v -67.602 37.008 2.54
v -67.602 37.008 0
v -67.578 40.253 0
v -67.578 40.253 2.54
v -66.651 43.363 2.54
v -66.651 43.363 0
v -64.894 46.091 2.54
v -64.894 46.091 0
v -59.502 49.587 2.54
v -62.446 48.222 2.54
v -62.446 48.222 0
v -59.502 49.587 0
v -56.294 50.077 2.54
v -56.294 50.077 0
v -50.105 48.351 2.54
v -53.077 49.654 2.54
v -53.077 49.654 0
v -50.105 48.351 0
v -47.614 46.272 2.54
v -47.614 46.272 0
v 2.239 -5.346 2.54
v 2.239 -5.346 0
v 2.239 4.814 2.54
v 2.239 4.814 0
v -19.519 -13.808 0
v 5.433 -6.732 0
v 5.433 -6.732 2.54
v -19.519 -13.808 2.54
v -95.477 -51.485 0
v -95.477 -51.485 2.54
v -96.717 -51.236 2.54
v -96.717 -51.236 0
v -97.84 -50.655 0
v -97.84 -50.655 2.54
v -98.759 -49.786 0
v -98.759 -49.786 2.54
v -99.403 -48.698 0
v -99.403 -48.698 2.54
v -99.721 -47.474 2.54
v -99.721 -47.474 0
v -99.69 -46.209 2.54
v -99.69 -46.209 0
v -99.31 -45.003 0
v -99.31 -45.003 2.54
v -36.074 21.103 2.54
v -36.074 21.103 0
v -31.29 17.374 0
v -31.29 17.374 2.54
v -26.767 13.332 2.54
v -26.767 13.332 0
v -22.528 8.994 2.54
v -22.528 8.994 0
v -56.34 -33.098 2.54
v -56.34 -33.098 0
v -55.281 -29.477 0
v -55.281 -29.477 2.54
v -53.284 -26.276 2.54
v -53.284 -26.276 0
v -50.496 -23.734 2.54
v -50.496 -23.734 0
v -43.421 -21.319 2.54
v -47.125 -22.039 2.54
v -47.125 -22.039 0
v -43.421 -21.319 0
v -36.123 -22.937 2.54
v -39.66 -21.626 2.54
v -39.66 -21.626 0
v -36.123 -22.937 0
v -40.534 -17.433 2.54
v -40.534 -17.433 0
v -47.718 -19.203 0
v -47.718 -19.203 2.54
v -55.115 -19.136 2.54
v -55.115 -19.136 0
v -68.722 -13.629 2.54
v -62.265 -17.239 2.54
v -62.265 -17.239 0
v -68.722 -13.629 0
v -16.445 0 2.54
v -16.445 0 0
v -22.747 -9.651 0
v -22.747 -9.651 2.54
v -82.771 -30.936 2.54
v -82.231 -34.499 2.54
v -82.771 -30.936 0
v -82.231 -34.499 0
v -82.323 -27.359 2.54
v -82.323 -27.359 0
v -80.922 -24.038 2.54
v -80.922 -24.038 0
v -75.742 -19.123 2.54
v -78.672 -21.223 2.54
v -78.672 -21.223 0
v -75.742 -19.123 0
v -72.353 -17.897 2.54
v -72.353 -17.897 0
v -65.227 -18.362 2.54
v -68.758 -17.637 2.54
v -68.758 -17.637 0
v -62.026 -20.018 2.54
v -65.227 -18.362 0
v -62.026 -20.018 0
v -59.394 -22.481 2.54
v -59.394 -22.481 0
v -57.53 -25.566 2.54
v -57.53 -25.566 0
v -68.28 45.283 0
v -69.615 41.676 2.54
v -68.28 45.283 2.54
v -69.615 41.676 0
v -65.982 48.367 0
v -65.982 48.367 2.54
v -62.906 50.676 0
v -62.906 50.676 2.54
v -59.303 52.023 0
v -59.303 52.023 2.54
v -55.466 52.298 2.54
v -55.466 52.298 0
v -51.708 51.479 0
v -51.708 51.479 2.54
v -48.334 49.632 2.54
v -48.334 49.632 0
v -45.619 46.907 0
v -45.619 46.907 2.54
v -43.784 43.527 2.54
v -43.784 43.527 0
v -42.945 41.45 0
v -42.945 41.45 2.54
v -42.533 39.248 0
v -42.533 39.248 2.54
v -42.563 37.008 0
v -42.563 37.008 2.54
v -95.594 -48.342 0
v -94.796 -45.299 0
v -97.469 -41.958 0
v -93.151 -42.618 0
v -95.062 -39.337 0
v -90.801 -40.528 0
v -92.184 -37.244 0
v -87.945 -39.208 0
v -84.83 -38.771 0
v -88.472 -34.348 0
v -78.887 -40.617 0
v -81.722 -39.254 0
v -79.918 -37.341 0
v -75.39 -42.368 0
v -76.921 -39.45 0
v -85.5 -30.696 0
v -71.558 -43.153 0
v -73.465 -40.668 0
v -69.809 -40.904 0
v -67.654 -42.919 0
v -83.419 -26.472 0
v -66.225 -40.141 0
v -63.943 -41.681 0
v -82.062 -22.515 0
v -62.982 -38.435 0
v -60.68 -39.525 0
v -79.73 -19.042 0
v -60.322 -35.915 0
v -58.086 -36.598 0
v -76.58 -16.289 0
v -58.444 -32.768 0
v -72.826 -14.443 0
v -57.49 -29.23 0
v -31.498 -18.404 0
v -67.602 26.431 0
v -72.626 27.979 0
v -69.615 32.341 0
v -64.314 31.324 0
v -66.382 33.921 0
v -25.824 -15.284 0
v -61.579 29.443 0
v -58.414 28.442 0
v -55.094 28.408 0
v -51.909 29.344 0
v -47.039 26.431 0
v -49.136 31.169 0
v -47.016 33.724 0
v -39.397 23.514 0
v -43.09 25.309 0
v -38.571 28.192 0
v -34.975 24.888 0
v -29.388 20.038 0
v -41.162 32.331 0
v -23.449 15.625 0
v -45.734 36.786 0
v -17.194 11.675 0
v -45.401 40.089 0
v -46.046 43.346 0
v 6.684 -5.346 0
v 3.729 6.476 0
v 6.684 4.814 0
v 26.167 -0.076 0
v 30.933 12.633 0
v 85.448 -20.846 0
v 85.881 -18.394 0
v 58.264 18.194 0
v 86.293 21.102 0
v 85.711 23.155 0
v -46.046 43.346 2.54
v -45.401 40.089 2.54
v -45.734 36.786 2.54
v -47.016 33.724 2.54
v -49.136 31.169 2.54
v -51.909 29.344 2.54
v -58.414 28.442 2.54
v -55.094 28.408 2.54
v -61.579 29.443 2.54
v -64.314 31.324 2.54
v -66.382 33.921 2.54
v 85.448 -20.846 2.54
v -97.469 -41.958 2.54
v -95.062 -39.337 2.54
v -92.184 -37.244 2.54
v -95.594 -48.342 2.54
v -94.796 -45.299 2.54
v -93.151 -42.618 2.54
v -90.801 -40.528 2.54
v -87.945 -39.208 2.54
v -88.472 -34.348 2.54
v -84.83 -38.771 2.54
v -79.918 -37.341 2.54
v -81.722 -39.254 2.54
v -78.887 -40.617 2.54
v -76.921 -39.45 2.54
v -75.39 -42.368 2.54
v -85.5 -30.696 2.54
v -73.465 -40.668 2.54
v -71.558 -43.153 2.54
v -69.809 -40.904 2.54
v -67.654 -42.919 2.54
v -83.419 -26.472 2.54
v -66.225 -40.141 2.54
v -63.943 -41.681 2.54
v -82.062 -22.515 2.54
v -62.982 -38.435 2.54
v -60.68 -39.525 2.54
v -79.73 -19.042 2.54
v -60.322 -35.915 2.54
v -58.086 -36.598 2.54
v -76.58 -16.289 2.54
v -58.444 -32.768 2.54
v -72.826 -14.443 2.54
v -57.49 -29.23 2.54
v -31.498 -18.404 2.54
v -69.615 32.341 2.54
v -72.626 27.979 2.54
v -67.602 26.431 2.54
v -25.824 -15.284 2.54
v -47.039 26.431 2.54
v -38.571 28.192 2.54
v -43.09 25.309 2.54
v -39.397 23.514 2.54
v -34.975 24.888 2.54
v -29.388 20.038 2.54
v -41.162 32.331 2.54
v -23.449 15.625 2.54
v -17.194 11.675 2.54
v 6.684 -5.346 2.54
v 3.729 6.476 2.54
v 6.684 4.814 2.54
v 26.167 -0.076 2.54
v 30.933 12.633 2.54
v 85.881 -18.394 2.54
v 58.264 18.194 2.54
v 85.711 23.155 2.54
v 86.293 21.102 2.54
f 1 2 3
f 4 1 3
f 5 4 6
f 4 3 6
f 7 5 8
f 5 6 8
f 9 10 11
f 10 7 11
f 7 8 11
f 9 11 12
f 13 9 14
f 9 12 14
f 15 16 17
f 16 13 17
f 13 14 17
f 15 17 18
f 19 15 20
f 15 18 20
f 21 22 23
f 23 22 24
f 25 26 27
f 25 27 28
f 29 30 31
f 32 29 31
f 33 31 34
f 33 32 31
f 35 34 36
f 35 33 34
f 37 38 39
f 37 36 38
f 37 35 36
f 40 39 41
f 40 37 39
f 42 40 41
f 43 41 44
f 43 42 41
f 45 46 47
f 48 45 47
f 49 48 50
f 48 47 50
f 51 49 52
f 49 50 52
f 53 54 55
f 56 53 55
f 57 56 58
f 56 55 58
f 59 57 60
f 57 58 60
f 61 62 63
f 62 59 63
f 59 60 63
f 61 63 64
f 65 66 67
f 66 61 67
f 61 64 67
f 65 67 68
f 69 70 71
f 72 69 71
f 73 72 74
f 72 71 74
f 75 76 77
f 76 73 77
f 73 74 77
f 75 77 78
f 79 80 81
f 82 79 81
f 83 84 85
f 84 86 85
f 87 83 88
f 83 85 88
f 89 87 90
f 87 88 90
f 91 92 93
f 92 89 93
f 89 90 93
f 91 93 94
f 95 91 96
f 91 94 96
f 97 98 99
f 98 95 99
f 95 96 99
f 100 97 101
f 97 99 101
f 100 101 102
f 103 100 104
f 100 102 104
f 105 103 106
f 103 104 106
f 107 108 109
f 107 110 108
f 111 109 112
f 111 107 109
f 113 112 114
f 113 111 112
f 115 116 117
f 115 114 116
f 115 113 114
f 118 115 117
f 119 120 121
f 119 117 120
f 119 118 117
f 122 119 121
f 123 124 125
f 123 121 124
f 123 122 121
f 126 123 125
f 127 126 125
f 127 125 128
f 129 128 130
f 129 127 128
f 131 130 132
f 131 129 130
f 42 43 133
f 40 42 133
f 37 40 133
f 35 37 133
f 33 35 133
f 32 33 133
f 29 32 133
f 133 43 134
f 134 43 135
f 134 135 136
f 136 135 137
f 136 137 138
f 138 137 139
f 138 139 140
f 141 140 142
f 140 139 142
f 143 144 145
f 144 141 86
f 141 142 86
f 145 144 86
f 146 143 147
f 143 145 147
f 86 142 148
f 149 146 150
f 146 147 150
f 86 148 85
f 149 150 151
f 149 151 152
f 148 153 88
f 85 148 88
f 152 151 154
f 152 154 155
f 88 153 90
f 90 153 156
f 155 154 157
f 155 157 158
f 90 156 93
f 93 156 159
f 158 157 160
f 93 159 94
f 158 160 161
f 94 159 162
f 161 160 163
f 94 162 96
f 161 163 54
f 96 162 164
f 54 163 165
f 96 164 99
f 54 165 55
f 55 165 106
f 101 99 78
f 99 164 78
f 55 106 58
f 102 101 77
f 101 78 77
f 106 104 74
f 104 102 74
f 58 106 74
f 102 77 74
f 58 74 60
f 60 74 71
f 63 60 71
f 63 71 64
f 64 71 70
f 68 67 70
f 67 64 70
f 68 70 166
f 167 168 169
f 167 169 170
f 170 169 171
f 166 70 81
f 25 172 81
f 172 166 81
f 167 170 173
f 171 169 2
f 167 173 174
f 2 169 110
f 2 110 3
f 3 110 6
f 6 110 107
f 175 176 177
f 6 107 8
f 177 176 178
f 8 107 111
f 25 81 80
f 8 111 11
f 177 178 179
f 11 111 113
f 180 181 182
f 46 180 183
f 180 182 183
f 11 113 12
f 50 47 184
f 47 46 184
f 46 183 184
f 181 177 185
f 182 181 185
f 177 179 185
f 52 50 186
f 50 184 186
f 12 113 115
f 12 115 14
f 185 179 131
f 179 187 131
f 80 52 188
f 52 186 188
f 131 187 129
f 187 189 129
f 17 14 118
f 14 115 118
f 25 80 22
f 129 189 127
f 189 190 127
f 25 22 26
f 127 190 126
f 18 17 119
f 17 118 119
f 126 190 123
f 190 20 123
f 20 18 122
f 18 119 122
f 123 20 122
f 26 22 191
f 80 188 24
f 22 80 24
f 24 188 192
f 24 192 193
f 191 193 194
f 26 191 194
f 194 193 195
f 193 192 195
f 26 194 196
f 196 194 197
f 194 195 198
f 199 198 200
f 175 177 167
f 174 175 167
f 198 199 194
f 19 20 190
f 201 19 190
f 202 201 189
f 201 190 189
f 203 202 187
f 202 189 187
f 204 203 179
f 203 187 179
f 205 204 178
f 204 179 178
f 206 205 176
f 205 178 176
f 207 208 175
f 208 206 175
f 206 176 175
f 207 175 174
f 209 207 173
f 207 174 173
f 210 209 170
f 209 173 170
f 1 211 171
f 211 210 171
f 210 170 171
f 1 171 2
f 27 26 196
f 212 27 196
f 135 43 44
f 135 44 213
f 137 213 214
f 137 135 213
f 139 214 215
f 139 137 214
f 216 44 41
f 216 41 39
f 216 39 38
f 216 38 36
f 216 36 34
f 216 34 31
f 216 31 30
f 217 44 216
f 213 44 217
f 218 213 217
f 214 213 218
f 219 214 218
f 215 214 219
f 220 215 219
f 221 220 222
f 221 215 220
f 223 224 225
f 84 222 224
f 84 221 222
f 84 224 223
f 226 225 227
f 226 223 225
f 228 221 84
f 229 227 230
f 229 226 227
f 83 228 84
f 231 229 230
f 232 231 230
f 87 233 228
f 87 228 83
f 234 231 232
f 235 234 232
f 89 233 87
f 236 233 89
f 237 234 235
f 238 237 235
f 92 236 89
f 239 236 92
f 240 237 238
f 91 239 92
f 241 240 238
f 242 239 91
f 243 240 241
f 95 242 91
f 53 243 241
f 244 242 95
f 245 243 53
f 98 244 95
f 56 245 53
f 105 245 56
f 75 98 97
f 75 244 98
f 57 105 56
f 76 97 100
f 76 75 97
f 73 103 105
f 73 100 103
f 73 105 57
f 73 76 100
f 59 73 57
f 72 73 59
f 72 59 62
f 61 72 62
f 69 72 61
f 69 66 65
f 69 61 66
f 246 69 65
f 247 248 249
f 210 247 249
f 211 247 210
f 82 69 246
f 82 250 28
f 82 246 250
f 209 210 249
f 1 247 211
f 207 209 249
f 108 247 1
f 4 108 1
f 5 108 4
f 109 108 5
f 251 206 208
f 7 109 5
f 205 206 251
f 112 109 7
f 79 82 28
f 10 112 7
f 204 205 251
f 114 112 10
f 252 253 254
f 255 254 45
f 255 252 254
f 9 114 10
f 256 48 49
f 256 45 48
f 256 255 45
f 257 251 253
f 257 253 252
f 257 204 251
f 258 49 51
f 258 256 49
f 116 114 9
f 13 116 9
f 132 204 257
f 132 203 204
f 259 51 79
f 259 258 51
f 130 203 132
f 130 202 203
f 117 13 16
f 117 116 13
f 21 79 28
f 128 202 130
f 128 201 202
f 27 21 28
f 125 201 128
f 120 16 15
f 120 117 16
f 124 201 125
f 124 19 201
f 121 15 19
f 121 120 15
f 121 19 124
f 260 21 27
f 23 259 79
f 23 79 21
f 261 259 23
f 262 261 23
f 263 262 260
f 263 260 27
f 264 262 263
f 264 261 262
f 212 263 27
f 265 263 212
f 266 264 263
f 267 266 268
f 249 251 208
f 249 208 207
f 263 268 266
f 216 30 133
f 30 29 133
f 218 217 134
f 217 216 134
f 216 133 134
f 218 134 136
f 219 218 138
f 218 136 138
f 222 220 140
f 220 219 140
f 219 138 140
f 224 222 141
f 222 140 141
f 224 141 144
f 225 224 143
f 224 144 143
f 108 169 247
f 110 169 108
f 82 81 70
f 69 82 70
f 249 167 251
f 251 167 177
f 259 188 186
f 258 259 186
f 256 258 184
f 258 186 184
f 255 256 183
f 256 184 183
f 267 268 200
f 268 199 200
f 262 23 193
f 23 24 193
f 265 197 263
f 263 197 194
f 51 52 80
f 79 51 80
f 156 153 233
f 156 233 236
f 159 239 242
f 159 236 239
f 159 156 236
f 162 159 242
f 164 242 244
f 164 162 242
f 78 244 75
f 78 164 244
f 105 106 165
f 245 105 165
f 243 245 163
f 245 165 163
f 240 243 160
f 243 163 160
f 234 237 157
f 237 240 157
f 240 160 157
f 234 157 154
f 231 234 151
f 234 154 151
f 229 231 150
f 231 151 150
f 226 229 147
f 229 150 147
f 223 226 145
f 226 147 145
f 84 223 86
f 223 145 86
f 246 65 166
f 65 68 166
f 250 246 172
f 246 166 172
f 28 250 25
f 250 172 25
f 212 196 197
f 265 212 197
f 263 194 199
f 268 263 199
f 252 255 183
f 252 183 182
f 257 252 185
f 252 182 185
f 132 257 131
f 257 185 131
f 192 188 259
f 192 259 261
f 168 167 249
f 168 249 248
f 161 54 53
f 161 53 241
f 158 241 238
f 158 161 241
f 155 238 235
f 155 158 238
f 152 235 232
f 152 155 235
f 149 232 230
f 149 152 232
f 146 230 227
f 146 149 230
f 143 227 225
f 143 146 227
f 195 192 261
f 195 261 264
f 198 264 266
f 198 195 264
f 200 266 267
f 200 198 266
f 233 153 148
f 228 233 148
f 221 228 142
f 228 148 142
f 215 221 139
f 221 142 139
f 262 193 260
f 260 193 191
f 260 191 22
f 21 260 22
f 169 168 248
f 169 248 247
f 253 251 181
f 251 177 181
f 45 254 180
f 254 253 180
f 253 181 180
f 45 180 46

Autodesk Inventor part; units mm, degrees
ref_plane "YZ Plane" through (0, 0, 0) normal (1, 0, 0) x (0, 1, 0)
ref_plane "XZ Plane" through (0, 0, 0) normal (0, 1, 0) x (-1, 0, 0)
ref_plane "XY Plane" through (0, 0, 0) normal (0, 0, 1) x (1, 0, 0)
sketch "Sketch1" plane through (0, 0, 0) normal (0, 0, 1) x (1, 0, 0)
  line L0 (-121.92, 53.34) -> (121.92, 53.34)
  line L1 (121.92, 53.34) -> (121.92, -53.34)
  line L2 (121.92, -53.34) -> (-121.92, -53.34)
  line L3 (-121.92, -53.34) -> (-121.92, 53.34)
  line L4 (-121.92, 53.34) -> (121.92, -53.34) construction
  line L5 (121.92, 53.34) -> (-121.92, -53.34) construction
  line L6 (99.0307, 67.3864) -> (98.1801, -71.8373) construction
  line L7 (98.1801, -71.8373) -> (-108.1272, -70.5768) construction
  line L8 (-108.1272, -70.5768) -> (-107.2765, 68.6469) construction
  line L9 (-107.2765, 68.6469) -> (99.0307, 67.3864) construction
  arc A0 (-78.8873, -40.6173) -> (-95.4767, -51.4852) centre (-84.9112, -49.5176) ccw
  arc A1 (-78.8873, -40.6173) -> (-56.3395, -33.0982) centre (-70.4947, -28.2175) ccw
  arc A2 (-36.1227, -22.9374) -> (-56.3395, -33.0982) centre (-42.6558, -35.1316) ccw
  arc A3 (-19.5186, -13.8085) -> (-36.1227, -22.9374) centre (-17.295, -37.5173) ccw
  arc A4 (-68.7224, -13.6289) -> (-40.5344, -17.4333) centre (-51.1537, 10.214) ccw
  arc A5 (-68.7224, -13.6289) -> (-83.4187, -26.4721) centre (-67.6747, -29.6577) ccw
  arc A6 (-92.1839, -37.2444) -> (-83.4187, -26.4721) centre (-103.1345, -19.3818) ccw
  arc A7 (-92.1839, -37.2444) -> (-99.3105, -45.0028) centre (-83.147, -52.6977) ccw
  arc A8 (-99.3105, -45.0028) -> (-95.4767, -51.4852) centre (-95.2121, -46.9539) ccw
  arc A9 (-82.2314, -34.4993) -> (-57.5296, -25.5657) centre (-70.7814, -27.5415) ccw
  arc A10 (-57.5296, -25.5657) -> (-82.2314, -34.4993) centre (-69.6152, -30.7661) ccw
  line L10 (5.4328, -6.7323) -> (-19.5186, -13.8085)
  line L11 (5.4328, -6.7323) -> (85.4483, -20.8459)
  line L12 (85.4483, -20.8459) -> (85.8807, -18.3941)
  line L13 (85.8807, -18.3941) -> (26.167, -0.0762)
  line L14 (26.167, -0.0762) -> (86.2931, 21.1025)
  line L15 (86.2931, 21.1025) -> (85.711, 23.1551)
  arc A11 (85.711, 23.1551) -> (3.7291, 6.4763) centre (298.902, -1234.5808) ccw
  line L16 (-54.4933, 26.4309) -> (-67.6017, 26.4309)
  line L17 (-67.6017, 26.4309) -> (-72.6264, 27.9793)
  line L18 (-72.6264, 27.9793) -> (-69.6152, 32.3411)
  line L19 (-69.6152, 32.3411) -> (-69.6152, 41.676)
  arc A12 (-43.7838, 43.5271) -> (-69.6152, 41.676) centre (-56.4305, 38.848) ccw
  arc A13 (-47.6138, 46.2719) -> (-67.6017, 37.0085) centre (-56.174, 38.5465) ccw
  arc A14 (-67.6017, 37.0085) -> (-47.6138, 46.2719) centre (-56.6407, 39.5536) ccw
  arc A15 (-42.5631, 37.0085) -> (-43.7838, 43.5271) centre (-53.7825, 38.2811) ccw
  arc A16 (-42.5631, 37.0085) -> (-34.9749, 24.888) centre (-24.5395, 39.8568) ccw
  line L20 (-54.4933, 26.4309) -> (-47.0393, 26.4309)
  arc A17 (-36.0743, 21.1026) -> (-47.0393, 26.4309) centre (-51.4449, 3.4184) ccw
  arc A18 (-22.5276, 8.9937) -> (-36.0743, 21.1026) centre (-88.9207, -51.6509) ccw
  arc A19 (-34.9749, 24.888) -> (-17.1938, 11.6747) centre (31.7815, 96.1512) ccw
  line L21 (-22.5276, 8.9937) -> (-16.445, 0)
  line L22 (-16.445, 0) -> (-22.747, -9.6513)
  line L23 (-22.747, -9.6513) -> (-40.5344, -17.4333)
  line L24 (-17.1938, 11.6747) -> (3.7291, 6.4763)
  line L25 (-16.445, 0) -> (3.7291, 6.4763)
  line L26 (5.4328, -6.7323) -> (26.167, -0.0762)
  line L27 (2.2389, 4.8137) -> (6.6839, 4.8137)
  line L28 (6.6839, 4.8137) -> (6.6839, -5.3463)
  line L29 (6.6839, -5.3463) -> (2.2389, -5.3463)
  line L30 (2.2389, -5.3463) -> (2.2389, 4.8137)
  line L31 (2.2389, 4.8137) -> (6.6839, -5.3463) construction
  line L32 (6.6839, 4.8137) -> (2.2389, -5.3463) construction
  point P0 (0, 0)
  point P1 (4.4614, -0.2663)
  dimension "d0" = 243.84
  dimension "d1" = 106.68
  dimension "d23" = 4.445
  dimension "d24" = 10.16
extrude "Extrusion2" add sketch "Sketch1" along normal blind 2.54 contours A0 A8 A7 A6 A5 A4 L23 L22 L25 A11 L15 L14 L26 L10 A3 A2 A1 | L26 L13 L12 L11 | L21 A18 A17 L20 L16 L17 L18 L19 A12 A15 A16 A19 L24 L25
properties part number "RTS Scissors"
